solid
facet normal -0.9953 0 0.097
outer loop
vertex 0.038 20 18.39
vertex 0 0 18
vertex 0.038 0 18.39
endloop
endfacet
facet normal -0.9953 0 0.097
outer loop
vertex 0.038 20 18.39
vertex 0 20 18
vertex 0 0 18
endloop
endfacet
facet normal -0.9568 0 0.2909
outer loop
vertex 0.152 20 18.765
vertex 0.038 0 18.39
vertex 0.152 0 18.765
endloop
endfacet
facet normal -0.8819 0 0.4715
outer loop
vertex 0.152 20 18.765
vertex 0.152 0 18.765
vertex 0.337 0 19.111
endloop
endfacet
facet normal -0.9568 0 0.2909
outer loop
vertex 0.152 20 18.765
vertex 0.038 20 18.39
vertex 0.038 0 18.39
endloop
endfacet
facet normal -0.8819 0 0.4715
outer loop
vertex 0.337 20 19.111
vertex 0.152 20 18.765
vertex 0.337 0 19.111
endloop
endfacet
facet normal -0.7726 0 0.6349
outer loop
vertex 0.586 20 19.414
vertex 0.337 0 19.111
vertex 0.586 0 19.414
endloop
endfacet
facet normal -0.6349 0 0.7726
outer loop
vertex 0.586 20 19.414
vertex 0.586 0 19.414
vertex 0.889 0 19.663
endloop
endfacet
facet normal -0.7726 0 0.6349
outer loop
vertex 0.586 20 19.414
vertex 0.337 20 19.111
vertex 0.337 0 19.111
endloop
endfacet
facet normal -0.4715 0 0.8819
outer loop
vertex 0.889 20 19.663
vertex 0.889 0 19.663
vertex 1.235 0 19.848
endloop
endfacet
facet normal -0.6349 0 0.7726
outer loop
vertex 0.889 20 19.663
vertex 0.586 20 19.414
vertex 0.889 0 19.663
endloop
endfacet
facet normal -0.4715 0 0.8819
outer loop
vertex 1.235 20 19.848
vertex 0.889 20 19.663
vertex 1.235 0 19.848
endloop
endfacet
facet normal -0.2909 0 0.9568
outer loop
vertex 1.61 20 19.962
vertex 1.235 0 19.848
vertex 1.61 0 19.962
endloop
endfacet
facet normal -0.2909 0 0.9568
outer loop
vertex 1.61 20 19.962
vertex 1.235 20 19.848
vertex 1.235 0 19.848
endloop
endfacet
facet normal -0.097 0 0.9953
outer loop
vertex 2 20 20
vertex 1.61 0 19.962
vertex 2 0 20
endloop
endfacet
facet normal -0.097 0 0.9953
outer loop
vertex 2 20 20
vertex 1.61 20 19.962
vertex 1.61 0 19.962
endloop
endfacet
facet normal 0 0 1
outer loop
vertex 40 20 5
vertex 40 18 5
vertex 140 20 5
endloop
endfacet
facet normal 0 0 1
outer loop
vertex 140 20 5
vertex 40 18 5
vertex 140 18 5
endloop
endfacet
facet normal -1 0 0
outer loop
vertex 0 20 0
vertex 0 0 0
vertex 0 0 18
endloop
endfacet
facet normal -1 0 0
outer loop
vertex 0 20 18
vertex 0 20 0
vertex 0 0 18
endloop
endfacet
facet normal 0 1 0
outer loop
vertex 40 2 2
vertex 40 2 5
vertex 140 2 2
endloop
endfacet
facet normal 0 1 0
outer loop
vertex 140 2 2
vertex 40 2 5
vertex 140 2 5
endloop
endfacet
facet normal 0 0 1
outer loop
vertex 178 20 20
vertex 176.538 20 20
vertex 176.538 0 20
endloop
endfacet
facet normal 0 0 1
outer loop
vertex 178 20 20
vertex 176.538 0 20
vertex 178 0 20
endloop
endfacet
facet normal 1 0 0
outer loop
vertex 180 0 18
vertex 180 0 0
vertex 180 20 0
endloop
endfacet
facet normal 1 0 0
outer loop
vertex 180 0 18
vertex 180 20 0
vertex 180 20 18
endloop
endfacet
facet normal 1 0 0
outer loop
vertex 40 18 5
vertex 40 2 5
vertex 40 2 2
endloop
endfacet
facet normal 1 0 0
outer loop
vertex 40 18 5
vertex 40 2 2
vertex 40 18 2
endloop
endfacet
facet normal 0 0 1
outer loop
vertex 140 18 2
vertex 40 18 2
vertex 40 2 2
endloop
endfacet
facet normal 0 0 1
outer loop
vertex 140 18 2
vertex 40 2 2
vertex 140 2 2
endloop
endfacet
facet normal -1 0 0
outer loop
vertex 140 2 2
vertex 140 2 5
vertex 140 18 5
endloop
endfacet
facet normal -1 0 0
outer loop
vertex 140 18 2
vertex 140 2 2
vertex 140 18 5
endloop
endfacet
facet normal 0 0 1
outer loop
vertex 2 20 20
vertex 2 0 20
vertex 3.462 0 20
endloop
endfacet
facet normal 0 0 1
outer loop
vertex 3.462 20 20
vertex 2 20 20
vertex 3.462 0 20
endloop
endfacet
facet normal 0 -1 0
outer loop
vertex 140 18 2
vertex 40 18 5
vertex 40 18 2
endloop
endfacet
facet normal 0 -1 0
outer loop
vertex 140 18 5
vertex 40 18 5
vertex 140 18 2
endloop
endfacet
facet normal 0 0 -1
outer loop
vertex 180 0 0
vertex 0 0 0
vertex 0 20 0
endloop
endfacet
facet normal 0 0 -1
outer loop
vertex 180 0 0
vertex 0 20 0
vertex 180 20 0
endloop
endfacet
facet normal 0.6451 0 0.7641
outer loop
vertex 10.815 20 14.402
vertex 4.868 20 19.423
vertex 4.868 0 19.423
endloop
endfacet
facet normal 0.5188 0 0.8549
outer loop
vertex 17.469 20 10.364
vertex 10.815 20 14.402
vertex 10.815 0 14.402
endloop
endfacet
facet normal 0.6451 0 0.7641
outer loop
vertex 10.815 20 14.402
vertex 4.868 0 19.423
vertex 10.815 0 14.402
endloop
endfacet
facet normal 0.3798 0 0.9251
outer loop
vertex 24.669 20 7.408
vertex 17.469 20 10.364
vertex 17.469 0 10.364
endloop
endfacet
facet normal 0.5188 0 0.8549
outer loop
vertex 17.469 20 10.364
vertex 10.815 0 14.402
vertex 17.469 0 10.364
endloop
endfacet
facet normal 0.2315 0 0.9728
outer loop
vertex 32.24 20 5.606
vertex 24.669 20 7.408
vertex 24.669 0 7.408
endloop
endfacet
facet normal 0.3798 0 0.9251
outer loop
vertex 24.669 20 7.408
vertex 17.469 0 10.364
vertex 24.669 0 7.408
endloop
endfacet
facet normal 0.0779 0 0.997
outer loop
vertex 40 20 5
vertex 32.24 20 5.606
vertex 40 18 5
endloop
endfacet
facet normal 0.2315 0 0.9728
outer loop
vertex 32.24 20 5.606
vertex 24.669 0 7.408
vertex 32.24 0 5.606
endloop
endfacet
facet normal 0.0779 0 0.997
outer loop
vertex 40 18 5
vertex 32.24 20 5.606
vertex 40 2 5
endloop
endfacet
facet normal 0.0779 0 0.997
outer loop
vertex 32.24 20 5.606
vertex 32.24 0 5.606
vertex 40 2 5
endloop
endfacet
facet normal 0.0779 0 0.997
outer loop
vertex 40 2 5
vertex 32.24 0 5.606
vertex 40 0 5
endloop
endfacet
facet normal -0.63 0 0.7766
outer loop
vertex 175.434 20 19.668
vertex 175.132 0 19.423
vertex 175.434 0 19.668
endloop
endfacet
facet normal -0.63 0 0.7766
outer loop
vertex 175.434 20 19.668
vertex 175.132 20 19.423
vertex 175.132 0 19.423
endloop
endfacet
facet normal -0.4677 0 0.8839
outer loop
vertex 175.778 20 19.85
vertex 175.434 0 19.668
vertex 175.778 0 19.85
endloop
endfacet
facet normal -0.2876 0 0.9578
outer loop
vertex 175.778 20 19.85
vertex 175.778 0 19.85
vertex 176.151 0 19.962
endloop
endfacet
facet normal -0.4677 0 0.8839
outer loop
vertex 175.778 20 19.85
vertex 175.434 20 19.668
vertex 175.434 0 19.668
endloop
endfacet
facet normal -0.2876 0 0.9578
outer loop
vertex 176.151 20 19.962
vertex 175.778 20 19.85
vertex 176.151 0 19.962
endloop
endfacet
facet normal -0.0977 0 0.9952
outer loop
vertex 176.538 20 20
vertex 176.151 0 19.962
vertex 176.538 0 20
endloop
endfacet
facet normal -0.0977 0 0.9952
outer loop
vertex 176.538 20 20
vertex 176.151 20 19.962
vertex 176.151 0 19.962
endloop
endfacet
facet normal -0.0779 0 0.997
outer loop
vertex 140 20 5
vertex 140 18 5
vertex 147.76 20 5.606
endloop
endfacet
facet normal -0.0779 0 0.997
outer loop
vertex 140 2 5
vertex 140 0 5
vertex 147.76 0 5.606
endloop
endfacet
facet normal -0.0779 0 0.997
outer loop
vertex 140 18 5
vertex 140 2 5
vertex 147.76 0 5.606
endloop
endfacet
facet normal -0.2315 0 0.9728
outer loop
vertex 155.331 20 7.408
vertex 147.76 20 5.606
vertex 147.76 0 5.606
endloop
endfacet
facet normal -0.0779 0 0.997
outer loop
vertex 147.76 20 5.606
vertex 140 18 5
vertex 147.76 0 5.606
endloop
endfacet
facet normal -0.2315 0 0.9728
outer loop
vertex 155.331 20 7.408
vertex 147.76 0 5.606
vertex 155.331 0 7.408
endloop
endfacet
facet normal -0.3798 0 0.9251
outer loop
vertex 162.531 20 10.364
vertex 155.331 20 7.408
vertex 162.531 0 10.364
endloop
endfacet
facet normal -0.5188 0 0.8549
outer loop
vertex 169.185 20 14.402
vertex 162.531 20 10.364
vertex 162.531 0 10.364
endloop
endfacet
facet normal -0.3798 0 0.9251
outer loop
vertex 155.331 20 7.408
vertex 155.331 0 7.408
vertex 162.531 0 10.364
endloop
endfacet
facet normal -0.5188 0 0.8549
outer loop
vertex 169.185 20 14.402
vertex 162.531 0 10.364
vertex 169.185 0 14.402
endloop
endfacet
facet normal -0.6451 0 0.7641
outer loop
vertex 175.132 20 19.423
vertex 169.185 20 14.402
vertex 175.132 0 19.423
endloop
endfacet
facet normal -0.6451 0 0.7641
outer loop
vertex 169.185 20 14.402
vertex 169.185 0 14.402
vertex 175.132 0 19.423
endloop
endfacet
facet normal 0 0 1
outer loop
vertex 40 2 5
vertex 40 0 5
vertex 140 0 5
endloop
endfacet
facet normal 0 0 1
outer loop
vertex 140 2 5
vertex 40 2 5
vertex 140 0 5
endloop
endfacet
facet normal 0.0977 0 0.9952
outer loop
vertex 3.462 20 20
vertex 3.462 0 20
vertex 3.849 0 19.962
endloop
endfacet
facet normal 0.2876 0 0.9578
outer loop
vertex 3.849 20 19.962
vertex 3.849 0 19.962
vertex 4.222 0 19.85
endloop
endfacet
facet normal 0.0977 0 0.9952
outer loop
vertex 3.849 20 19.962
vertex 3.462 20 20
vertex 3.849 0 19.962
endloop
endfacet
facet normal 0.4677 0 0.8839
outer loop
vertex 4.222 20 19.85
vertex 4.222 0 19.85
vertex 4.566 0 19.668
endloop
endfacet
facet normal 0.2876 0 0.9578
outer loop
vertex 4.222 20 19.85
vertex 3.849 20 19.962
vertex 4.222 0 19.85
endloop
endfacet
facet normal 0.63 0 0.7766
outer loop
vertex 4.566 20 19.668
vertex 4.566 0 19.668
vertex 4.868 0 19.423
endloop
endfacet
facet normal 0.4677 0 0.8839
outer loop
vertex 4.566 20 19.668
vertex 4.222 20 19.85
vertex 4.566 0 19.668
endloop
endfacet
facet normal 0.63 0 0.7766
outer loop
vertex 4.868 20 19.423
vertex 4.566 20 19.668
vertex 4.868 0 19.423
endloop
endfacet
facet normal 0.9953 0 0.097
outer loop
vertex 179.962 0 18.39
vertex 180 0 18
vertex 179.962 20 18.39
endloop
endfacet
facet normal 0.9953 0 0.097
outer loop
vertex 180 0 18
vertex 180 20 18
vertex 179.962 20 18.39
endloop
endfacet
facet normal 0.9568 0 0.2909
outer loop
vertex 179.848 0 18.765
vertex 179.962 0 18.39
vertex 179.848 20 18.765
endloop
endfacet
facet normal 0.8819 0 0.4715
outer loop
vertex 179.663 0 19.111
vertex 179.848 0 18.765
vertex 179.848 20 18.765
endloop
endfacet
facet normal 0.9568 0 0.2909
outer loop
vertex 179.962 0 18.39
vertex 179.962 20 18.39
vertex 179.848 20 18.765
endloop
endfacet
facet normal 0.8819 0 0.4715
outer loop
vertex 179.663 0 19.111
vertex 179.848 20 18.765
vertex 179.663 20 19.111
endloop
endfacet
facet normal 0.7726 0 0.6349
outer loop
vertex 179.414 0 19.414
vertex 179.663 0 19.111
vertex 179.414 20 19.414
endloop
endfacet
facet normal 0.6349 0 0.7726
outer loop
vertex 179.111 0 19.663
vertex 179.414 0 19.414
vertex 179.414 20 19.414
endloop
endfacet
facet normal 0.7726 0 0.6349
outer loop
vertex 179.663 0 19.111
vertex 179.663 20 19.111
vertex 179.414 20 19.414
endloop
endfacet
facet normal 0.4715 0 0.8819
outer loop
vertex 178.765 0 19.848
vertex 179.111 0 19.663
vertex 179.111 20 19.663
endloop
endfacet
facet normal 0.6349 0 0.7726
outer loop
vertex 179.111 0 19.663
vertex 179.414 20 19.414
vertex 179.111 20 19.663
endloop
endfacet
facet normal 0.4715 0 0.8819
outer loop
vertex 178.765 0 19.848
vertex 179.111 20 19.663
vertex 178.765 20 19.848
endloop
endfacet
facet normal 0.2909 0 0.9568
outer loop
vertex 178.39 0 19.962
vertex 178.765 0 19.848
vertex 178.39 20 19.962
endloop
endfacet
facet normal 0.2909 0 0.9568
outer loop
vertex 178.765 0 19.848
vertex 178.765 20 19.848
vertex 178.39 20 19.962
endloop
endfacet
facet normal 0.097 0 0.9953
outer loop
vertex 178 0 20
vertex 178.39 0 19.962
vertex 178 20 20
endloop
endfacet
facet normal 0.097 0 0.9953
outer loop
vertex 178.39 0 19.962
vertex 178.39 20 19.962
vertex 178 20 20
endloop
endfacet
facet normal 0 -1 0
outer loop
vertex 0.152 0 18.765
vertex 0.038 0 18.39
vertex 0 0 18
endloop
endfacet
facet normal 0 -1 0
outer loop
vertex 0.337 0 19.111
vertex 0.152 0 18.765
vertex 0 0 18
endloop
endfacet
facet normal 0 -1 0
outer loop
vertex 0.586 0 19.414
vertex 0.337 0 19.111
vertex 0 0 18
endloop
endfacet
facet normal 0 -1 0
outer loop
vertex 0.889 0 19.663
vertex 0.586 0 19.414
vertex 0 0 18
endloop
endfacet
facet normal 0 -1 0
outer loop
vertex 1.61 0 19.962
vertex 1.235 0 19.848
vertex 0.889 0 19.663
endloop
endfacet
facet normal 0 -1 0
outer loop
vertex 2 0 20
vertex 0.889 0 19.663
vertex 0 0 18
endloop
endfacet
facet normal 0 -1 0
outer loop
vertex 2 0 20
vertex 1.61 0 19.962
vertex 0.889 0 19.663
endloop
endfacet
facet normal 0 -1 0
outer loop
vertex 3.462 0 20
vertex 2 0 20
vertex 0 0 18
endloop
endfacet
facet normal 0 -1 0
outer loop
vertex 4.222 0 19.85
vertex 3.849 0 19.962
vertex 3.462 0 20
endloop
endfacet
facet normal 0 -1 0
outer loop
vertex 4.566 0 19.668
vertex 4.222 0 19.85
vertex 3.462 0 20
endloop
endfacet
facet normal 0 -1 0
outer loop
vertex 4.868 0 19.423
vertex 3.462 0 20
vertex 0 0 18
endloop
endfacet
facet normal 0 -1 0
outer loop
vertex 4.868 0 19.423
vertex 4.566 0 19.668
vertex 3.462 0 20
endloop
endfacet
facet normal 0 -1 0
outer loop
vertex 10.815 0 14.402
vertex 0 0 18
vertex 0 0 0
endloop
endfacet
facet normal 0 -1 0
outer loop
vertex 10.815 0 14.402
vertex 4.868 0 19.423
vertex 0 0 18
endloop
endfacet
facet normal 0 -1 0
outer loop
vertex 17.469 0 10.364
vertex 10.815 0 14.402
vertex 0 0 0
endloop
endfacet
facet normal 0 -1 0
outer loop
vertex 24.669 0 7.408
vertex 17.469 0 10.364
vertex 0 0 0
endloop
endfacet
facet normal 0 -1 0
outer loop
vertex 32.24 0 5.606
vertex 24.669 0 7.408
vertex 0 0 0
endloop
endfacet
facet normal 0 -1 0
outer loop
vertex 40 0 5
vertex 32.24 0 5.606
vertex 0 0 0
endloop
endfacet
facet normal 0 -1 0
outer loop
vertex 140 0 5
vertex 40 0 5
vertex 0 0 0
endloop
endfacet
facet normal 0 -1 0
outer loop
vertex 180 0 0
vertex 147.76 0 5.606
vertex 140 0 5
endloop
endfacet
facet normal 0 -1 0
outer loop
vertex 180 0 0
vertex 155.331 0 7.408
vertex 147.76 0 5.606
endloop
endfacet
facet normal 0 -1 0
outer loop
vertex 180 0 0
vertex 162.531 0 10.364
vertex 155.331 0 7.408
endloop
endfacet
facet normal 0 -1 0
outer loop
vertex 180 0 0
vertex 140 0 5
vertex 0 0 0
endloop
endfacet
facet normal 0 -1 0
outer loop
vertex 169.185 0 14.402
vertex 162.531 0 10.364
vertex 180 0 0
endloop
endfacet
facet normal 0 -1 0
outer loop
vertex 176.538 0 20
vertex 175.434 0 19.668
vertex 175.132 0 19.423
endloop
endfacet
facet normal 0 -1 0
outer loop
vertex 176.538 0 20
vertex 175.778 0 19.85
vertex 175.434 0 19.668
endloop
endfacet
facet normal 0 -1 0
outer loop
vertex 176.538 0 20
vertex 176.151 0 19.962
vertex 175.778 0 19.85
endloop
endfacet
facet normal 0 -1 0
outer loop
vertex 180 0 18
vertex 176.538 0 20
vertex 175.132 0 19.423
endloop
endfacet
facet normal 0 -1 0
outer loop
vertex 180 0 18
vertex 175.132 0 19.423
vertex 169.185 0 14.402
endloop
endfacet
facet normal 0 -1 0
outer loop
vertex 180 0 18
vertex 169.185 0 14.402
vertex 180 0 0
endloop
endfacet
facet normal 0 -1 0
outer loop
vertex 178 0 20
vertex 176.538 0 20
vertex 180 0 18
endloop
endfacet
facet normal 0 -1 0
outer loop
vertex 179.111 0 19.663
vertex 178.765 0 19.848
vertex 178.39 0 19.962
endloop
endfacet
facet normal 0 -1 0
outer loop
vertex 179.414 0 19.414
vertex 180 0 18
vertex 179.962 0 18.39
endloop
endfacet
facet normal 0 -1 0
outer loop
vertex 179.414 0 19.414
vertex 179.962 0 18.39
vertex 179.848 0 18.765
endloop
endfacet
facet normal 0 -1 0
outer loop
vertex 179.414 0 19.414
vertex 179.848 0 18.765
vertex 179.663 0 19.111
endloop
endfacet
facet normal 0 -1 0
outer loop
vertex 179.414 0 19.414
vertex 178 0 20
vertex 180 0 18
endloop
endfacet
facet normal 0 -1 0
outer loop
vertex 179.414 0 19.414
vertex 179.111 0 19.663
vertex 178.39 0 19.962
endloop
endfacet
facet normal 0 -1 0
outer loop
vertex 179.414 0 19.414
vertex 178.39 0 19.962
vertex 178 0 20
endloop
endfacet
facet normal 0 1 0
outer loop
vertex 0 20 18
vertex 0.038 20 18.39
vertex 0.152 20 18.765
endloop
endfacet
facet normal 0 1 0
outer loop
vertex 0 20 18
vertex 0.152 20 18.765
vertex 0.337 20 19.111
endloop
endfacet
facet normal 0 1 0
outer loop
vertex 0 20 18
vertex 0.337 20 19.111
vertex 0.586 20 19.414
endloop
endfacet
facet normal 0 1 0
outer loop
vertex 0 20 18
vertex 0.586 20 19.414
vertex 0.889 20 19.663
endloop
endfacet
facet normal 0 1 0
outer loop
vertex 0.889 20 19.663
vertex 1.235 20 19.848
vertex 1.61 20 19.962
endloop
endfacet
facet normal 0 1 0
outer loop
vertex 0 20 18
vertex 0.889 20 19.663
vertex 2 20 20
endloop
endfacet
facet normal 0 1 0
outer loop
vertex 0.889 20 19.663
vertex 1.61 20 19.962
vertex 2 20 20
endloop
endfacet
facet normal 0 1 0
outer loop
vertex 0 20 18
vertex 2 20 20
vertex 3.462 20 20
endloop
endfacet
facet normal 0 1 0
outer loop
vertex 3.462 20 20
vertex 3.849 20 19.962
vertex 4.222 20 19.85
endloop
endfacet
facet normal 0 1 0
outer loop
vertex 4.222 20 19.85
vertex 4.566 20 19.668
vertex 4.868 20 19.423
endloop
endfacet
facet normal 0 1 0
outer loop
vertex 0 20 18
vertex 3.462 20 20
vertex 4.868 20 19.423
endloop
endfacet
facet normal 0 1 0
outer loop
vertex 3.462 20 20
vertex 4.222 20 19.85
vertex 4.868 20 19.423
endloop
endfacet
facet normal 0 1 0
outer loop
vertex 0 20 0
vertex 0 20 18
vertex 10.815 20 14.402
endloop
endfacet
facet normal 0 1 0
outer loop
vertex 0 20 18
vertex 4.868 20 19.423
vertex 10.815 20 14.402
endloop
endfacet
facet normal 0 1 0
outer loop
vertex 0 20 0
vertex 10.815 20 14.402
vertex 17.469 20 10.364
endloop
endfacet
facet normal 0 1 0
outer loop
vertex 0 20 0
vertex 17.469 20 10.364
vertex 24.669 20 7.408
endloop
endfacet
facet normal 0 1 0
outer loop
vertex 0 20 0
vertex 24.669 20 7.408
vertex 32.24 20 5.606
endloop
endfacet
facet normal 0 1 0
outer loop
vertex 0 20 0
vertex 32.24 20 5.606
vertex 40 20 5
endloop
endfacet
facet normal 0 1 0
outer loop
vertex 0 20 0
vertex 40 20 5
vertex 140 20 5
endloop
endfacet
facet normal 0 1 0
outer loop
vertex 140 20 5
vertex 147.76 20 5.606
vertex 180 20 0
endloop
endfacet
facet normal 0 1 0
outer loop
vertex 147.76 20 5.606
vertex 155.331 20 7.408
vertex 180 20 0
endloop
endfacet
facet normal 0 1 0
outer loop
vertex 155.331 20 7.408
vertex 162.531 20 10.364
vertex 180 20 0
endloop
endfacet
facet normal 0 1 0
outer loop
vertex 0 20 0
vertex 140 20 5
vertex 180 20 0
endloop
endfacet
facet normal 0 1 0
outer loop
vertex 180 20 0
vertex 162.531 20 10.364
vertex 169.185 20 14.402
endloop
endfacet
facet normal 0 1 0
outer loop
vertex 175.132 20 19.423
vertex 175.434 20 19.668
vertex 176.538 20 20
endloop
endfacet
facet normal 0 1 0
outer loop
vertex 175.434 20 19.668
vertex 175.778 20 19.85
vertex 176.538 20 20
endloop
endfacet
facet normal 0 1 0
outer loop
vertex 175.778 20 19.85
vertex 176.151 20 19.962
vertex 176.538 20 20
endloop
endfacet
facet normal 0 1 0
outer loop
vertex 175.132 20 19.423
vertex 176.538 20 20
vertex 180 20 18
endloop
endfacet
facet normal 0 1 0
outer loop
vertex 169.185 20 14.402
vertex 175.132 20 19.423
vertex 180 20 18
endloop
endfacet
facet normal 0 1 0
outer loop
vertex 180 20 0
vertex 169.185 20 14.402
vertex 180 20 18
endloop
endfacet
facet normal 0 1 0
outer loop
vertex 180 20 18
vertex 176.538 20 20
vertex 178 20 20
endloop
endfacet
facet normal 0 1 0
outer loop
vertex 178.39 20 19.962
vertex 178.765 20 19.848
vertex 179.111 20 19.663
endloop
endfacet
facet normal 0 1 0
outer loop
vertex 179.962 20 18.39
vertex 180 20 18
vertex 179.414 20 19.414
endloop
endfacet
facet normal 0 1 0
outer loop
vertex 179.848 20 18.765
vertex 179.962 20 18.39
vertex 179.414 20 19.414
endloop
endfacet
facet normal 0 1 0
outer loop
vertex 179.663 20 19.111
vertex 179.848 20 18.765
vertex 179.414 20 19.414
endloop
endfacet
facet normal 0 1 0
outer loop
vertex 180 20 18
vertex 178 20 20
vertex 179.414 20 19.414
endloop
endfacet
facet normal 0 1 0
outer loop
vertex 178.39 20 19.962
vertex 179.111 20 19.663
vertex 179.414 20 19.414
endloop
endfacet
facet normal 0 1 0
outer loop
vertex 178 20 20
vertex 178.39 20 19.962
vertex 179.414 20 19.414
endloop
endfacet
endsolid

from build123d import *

# Parameters (mm, degrees)
F0_W     = 180
F0_H     = 20
F1_DEPTH = 20
F3_DEPTH = 25
F4_R     = 2
F5_W     = 100
F5_H     = 16
F6_DEPTH = 3


with BuildPart() as f1:
    # F0 (on Front) → F1 (new body)
    with BuildSketch(Plane.XZ):
        with Locations((90, 10)):
            Rectangle(F0_W, F0_H)
    extrude(amount=-F1_DEPTH)

    # F2 (on face) → F3 (cut)
    with BuildSketch(Plane.XZ):
        with BuildLine():
            Line((75.7071421427, 20), (4.2928578573, 20))
            ThreePointArc((4.2928578573, 20), (20.635083269, 8.9022777135), (40, 5))
            ThreePointArc((40, 5), (59.364916731, 8.9022777135), (75.7071421427, 20))
        make_face()
        with BuildLine():
            Line((175.7071421427, 20), (104.2928578573, 20))
            ThreePointArc((104.2928578573, 20), (120.635083269, 8.9022777135), (140, 5))
            ThreePointArc((140, 5), (159.364916731, 8.9022777135), (175.7071421427, 20))
        make_face()
        with BuildLine():
            Line((104.2928578573, 20), (75.7071421427, 20))
            ThreePointArc((75.7071421427, 20), (59.364916731, 8.9022777135), (40, 5))
            Line((40, 5), (140, 5))
            ThreePointArc((140, 5), (120.635083269, 8.9022777135), (104.2928578573, 20))
        make_face()
    extrude(amount=-F3_DEPTH, mode=Mode.SUBTRACT)

    # F4
    f4_edges = [f1.edges().sort_by_distance(p)[0] for p in [
        (0, 10, 20),
        (4.292858, 10, 20),
        (175.707142, 10, 20),
        (180, 10, 20),
    ]]
    fillet(f4_edges, radius=F4_R)

    # F5 (on face) → F6 (cut)
    with BuildSketch(Plane.XY.offset(5)):
        with Locations((90, 10)):
            Rectangle(F5_W, F5_H)
    extrude(amount=-F6_DEPTH, mode=Mode.SUBTRACT)


solid = f1.part
